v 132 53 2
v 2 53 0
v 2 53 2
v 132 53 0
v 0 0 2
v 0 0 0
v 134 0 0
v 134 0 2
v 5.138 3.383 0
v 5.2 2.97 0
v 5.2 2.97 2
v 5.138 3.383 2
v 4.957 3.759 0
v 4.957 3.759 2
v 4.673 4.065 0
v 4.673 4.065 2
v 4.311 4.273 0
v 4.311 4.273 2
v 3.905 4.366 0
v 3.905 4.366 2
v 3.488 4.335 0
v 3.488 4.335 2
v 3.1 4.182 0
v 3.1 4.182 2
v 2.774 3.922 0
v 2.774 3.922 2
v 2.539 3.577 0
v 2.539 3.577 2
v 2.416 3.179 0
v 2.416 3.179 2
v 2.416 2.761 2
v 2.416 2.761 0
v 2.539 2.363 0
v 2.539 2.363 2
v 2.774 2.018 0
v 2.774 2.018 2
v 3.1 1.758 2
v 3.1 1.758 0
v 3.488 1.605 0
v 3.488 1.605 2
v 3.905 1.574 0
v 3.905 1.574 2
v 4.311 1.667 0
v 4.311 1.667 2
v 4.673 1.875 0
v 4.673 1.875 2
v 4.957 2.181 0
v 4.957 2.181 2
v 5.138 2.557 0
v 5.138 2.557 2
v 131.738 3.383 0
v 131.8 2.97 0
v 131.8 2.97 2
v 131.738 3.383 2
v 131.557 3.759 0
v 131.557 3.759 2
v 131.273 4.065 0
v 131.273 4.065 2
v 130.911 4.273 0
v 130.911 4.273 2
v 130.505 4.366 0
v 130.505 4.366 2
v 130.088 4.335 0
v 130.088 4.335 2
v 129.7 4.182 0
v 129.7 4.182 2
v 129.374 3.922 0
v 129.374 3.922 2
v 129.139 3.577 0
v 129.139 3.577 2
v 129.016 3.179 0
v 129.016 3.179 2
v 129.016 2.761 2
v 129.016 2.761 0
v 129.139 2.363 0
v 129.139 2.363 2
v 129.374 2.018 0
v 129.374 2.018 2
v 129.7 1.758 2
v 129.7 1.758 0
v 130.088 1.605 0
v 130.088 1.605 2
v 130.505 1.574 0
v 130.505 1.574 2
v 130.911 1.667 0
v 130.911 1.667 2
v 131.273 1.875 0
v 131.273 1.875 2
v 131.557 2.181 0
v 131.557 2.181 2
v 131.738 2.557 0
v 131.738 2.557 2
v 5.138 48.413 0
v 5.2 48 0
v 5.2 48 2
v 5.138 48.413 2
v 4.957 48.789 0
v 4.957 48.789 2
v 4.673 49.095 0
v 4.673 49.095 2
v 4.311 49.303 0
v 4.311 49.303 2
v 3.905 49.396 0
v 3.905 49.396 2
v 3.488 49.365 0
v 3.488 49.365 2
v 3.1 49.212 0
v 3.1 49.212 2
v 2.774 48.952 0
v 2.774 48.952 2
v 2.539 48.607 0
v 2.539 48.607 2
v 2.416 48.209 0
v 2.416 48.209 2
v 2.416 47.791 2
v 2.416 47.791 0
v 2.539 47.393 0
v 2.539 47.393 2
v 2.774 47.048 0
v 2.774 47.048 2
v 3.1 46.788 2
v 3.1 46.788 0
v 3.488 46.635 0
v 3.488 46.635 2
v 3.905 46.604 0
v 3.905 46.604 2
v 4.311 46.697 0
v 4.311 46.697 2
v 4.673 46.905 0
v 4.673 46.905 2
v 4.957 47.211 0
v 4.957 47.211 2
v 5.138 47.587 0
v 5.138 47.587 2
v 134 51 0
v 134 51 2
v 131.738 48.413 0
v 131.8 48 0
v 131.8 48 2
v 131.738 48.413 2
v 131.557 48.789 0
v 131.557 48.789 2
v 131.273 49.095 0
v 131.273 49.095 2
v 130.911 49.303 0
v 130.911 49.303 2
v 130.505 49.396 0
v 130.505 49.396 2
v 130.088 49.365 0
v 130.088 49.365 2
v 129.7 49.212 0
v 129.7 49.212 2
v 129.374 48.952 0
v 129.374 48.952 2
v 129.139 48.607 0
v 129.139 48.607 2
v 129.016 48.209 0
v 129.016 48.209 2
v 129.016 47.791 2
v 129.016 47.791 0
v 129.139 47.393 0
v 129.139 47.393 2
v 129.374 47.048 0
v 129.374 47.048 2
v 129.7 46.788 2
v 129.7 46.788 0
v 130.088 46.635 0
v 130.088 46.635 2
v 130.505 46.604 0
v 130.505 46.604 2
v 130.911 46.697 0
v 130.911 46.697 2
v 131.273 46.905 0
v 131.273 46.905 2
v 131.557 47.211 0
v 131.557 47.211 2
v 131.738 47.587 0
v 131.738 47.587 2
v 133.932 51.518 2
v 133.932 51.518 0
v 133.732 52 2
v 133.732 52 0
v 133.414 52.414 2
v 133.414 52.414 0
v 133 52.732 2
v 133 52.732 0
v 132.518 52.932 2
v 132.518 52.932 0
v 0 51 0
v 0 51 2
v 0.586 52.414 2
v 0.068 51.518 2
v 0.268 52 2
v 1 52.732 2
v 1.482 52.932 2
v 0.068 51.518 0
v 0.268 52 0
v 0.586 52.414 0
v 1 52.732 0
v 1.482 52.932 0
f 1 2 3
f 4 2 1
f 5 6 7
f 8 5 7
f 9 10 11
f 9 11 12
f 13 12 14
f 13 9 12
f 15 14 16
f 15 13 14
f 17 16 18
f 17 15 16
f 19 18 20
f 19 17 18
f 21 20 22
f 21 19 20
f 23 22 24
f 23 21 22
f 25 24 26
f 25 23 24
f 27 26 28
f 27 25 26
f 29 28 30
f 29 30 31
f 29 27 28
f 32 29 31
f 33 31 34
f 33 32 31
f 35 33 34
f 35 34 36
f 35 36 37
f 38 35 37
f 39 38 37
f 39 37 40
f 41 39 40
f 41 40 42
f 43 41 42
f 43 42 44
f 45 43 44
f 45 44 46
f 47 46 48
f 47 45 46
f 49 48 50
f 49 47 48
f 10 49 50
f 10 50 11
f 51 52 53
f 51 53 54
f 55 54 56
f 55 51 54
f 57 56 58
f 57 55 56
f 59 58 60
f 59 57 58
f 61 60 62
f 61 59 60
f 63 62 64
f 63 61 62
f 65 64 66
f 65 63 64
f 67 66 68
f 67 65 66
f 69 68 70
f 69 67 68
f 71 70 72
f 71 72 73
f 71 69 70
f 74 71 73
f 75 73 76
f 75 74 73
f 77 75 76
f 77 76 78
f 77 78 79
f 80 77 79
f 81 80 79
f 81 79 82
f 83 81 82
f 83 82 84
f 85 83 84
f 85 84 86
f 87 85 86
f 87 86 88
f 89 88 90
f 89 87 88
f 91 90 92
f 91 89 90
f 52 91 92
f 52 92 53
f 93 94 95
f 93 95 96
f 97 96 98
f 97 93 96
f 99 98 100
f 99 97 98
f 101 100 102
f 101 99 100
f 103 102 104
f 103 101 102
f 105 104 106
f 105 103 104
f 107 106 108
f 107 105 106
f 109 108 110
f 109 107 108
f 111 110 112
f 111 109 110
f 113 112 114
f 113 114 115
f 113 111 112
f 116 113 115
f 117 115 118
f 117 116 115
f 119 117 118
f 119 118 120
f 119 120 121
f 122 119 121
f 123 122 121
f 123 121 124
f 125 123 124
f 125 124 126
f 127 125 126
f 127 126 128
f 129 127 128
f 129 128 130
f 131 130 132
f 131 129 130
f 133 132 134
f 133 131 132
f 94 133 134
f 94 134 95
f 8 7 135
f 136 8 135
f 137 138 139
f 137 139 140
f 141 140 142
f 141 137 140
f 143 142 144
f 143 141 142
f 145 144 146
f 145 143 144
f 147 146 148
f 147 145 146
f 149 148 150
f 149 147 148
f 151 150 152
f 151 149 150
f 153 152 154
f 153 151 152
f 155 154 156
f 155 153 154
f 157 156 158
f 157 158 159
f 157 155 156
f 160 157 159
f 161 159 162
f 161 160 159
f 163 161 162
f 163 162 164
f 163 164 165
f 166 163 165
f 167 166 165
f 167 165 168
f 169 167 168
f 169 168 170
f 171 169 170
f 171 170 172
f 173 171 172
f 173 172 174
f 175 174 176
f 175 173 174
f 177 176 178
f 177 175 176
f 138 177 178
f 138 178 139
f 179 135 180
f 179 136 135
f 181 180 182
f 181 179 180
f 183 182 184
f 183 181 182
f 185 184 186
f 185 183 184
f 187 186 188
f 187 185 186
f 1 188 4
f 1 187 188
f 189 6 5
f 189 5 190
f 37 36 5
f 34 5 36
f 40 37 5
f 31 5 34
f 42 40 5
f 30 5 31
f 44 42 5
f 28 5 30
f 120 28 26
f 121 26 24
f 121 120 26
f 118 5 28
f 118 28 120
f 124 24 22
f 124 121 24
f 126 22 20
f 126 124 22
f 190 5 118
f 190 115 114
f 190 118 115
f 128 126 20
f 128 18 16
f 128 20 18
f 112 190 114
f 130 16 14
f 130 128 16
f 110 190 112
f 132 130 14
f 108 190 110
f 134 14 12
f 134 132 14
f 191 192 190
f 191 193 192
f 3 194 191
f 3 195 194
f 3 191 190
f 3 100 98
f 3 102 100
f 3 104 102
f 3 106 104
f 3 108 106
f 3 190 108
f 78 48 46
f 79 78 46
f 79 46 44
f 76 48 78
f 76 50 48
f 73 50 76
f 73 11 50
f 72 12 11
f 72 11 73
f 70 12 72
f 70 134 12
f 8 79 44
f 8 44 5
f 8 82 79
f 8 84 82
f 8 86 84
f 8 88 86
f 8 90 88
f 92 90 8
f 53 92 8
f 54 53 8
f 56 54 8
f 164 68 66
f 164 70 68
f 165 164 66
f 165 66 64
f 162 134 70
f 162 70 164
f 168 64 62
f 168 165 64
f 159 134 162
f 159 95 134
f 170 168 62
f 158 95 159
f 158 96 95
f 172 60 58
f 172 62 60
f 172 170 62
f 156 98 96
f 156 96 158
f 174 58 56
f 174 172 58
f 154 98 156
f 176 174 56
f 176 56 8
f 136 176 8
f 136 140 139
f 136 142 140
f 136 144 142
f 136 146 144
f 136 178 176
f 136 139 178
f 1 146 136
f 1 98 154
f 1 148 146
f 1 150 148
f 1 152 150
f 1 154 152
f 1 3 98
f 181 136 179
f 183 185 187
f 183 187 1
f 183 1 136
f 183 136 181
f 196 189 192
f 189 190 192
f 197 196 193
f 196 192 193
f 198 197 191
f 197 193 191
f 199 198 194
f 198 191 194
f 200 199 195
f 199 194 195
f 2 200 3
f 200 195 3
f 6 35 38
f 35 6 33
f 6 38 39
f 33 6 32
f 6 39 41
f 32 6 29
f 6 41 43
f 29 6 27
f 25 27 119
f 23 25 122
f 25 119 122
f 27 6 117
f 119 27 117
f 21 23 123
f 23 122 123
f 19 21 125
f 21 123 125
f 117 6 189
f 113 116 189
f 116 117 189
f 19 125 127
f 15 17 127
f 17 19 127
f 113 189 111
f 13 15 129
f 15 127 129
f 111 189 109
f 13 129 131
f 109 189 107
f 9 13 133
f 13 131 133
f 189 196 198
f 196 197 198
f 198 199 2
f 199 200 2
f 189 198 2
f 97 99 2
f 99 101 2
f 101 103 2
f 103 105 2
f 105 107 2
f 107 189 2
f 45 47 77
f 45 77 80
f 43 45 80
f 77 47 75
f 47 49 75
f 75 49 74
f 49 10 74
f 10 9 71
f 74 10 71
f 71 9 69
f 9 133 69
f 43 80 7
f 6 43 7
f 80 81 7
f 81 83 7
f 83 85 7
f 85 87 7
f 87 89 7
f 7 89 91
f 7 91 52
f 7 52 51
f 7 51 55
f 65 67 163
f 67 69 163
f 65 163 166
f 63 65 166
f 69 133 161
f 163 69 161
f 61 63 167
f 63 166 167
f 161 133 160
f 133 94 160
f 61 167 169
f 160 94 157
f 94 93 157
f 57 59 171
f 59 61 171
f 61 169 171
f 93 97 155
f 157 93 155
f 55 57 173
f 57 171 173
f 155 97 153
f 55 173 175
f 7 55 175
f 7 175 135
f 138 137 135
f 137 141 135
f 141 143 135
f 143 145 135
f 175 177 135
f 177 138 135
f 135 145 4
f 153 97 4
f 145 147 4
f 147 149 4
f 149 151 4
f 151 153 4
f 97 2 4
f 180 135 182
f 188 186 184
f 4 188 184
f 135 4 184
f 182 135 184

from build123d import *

# Parameters (mm, degrees)
CYLINDER003_R     = 1.4
CYLINDER003_DEPTH = 2
CYLINDER001_R     = 1.4
CYLINDER001_DEPTH = 2
CYLINDER002_R     = 1.4
CYLINDER002_DEPTH = 2
CYLINDER_R        = 1.4
CYLINDER_DEPTH    = 2
BOX_W             = 134
BOX_H             = 53
BOX_DEPTH         = 2
FILLET_R          = 2


with BuildPart() as cylinder003:
    # Cylinder003 → Cylinder003 (new body)
    with BuildSketch(Plane(origin=(130.4, 48, 0), x_dir=(1, 0, 0), z_dir=(0, 0, 1))):
        Circle(CYLINDER003_R)
    extrude(amount=CYLINDER003_DEPTH)


with BuildPart() as cylinder001:
    # Cylinder001 → Cylinder001 (new body)
    with BuildSketch(Plane(origin=(3.8, 48, 0), x_dir=(1, 0, 0), z_dir=(0, 0, 1))):
        Circle(CYLINDER001_R)
    extrude(amount=CYLINDER001_DEPTH)


with BuildPart() as cylinder002:
    # Cylinder002 → Cylinder002 (new body)
    with BuildSketch(Plane(origin=(130.4, 2.97, 0), x_dir=(1, 0, 0), z_dir=(0, 0, 1))):
        Circle(CYLINDER002_R)
    extrude(amount=CYLINDER002_DEPTH)


with BuildPart() as fusion:
    # Cylinder → Cylinder (new body)
    with BuildSketch(Plane(origin=(3.8, 2.97, 0), x_dir=(1, 0, 0), z_dir=(0, 0, 1))):
        Circle(CYLINDER_R)
    extrude(amount=CYLINDER_DEPTH)

    # Fusion: union Cylinder003, Cylinder001, Cylinder002
    add(cylinder003.part)
    add(cylinder001.part)
    add(cylinder002.part)


with BuildPart() as cut:
    # Box → Box (new body)
    with BuildSketch(Plane.XY):
        with Locations((67, 26.5)):
            Rectangle(BOX_W, BOX_H)
    extrude(amount=BOX_DEPTH)

    # Fillet
    fillet_edges = [cut.edges().sort_by_distance(p)[0] for p in [
        (0, 53, 1),
        (134, 53, 1),
    ]]
    fillet(fillet_edges, radius=FILLET_R)

    # Cut: cut Fusion
    add(fusion.part, mode=Mode.SUBTRACT)


solid = cut.part
